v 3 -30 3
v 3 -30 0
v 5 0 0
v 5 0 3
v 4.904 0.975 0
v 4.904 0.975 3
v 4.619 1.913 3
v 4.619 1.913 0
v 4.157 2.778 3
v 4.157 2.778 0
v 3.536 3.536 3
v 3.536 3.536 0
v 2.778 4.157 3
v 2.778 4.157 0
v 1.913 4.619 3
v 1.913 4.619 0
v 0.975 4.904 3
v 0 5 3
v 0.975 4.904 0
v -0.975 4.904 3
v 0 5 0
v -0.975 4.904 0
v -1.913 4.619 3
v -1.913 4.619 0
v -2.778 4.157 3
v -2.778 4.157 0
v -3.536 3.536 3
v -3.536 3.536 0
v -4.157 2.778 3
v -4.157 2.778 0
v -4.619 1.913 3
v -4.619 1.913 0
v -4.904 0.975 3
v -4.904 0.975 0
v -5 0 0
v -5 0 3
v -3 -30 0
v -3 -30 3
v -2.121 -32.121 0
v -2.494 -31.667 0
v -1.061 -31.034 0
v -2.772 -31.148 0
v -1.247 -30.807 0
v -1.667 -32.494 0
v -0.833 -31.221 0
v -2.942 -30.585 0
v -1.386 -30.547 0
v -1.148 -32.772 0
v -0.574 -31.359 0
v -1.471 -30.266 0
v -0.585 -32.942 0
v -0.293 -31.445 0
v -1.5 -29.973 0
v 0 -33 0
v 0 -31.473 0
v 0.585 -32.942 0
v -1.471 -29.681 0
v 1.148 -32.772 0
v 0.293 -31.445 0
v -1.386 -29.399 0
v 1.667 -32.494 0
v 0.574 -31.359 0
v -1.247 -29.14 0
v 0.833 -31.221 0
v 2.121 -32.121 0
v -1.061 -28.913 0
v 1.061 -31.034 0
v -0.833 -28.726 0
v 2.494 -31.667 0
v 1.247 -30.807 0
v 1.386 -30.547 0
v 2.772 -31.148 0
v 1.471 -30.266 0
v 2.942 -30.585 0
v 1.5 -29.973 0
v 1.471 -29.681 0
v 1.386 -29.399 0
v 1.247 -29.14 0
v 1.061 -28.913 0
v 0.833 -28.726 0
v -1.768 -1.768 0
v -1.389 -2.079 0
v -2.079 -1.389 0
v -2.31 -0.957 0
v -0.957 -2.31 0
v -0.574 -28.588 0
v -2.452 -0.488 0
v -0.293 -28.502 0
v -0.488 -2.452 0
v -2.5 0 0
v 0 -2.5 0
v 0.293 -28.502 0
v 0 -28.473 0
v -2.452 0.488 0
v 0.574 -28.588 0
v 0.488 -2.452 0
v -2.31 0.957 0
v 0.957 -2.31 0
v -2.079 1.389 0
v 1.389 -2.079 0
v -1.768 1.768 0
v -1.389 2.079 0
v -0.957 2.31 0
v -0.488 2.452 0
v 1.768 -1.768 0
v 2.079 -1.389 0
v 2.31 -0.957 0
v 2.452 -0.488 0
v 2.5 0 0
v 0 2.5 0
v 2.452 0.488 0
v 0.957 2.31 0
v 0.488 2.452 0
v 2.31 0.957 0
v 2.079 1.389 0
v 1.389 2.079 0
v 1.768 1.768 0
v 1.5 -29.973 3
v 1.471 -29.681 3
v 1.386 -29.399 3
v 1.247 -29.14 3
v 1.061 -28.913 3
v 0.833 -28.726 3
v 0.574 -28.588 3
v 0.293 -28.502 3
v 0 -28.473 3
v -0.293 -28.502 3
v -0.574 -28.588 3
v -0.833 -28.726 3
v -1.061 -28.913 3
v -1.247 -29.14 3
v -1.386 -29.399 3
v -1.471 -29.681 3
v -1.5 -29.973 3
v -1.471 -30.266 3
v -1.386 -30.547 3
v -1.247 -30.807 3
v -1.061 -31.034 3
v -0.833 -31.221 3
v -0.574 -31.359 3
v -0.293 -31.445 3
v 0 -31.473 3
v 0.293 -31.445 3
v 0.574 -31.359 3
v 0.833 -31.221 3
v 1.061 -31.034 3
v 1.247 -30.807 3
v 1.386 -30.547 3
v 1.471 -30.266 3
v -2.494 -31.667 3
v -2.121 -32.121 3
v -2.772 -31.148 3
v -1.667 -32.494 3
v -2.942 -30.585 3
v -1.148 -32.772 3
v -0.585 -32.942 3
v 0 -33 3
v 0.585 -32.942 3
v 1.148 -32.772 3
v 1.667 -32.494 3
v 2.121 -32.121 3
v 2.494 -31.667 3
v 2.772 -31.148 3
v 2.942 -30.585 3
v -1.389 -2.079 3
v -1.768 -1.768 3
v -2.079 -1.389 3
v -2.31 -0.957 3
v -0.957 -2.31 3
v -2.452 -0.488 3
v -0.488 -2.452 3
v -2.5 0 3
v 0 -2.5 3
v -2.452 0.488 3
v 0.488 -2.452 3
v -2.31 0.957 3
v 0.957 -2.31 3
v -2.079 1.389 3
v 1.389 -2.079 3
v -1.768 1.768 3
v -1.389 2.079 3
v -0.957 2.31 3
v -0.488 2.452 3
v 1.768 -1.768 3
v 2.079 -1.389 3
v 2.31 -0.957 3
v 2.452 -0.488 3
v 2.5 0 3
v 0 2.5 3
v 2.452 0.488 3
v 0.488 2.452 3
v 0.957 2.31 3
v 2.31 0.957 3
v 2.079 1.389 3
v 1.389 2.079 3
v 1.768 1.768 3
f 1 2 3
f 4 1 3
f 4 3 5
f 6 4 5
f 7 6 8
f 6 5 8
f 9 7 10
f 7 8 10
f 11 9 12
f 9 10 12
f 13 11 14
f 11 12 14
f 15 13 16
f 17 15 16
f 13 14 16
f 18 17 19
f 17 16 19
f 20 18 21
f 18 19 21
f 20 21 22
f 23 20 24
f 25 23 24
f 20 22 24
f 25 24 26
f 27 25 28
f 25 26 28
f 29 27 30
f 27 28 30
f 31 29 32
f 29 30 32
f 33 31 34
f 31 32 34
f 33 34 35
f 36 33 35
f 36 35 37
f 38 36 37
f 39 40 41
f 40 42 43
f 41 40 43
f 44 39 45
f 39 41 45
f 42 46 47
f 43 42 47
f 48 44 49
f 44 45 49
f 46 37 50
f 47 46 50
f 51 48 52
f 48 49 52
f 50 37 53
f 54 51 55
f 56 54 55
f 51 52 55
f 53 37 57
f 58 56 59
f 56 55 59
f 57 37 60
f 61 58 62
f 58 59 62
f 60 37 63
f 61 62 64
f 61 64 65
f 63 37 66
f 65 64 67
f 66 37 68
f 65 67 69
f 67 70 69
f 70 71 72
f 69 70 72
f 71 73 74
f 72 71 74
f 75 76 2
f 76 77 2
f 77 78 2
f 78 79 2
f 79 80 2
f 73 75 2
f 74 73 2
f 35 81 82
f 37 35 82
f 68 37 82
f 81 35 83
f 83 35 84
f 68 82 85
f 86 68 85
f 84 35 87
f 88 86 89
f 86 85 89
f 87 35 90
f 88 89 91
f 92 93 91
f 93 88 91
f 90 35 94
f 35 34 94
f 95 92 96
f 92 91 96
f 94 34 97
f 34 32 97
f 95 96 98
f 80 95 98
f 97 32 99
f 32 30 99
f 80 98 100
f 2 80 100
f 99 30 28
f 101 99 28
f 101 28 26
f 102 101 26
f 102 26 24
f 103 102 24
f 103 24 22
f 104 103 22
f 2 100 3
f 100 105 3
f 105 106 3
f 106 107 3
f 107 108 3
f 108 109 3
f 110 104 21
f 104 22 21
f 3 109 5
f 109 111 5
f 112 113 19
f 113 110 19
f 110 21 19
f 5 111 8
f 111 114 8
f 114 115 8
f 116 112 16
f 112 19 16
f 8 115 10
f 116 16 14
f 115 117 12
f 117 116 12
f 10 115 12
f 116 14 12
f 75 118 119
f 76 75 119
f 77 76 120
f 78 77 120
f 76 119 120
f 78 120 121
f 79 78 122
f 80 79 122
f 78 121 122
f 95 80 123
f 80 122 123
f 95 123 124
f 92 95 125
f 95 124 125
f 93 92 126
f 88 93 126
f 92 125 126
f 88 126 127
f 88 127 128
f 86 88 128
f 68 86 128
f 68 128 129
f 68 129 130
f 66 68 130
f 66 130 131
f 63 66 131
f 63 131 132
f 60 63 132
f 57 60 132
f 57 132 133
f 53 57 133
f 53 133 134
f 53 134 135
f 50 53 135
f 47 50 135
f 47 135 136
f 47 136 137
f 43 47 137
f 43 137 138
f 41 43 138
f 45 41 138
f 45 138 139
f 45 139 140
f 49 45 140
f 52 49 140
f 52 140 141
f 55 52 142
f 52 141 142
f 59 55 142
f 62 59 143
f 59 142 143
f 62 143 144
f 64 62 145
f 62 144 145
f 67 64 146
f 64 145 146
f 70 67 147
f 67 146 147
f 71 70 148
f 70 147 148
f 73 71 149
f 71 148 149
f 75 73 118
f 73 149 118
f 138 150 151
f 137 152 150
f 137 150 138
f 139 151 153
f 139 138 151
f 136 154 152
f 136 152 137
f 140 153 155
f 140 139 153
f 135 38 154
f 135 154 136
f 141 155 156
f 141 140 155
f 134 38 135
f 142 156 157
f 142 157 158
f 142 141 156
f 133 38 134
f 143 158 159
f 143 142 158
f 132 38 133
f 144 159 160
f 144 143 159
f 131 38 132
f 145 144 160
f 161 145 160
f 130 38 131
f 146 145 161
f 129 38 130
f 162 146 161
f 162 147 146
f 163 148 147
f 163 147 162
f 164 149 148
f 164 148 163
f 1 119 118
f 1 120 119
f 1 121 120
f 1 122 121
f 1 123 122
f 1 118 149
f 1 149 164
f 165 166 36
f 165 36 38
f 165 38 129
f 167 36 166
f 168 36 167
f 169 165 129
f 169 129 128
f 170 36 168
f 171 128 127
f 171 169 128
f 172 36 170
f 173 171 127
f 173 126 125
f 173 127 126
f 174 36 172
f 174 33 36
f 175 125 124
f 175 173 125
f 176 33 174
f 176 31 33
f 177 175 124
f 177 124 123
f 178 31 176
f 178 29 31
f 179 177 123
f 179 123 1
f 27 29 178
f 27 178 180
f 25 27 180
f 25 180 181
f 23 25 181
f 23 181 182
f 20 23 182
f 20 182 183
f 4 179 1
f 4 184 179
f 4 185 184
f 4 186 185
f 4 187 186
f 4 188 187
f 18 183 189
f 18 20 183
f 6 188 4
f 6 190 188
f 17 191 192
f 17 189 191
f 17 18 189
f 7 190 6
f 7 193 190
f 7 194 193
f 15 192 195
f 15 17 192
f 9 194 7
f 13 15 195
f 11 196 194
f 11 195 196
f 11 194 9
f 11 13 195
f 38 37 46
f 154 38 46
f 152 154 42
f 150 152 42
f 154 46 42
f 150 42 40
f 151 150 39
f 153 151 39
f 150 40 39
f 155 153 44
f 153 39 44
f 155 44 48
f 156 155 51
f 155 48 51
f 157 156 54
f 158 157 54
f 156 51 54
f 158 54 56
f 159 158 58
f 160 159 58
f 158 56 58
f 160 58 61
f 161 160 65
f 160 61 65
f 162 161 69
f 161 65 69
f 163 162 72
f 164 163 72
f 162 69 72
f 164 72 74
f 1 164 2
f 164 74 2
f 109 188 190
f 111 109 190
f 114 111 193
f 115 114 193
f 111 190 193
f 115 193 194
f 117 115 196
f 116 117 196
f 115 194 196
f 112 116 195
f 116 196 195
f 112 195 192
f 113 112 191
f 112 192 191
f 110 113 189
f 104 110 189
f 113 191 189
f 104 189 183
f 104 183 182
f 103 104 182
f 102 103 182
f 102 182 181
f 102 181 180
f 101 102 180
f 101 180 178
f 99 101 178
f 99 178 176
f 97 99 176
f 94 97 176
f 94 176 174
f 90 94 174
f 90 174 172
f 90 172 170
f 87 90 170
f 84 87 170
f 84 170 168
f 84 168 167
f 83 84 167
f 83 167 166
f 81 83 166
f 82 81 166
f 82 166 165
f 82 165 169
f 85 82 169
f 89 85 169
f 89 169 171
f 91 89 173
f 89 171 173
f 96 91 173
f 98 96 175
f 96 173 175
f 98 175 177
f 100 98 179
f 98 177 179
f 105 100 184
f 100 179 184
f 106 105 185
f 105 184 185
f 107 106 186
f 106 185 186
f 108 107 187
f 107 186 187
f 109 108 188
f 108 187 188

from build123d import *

# Parameters (mm, degrees)
BOSS_EXTRUDE1_DEPTH = 3
SKETCH2_R           = 2.5
CUT_EXTRUDE1_DEPTH  = 34.51119216
SKETCH3_R           = 1.5
CUT_EXTRUDE2_DEPTH  = 34.51119216


with BuildPart() as part:
    # Sketch1 → Boss-Extrude1 (new body)
    with BuildSketch(Plane.XY):
        with BuildLine():
            Line((-5, 0), (-3, -30))
            ThreePointArc((-3, -30), (0, -33), (3, -30))
            Line((3, -30), (5, 0))
            ThreePointArc((5, 0), (0, 5), (-5, 0))
        make_face()
    extrude(amount=BOSS_EXTRUDE1_DEPTH)

    # Sketch2 → Cut-Extrude1 (cut, through all)
    with BuildSketch(Plane.XY.offset(3)):
        Circle(SKETCH2_R)
    extrude(amount=-CUT_EXTRUDE1_DEPTH, mode=Mode.SUBTRACT)

    # Sketch3 → Cut-Extrude2 (cut, through all)
    with BuildSketch(Plane.XY.offset(3)):
        with Locations((0, -29.973330892)):
            Circle(SKETCH3_R)
    extrude(amount=-CUT_EXTRUDE2_DEPTH, mode=Mode.SUBTRACT)


solid = part.part
